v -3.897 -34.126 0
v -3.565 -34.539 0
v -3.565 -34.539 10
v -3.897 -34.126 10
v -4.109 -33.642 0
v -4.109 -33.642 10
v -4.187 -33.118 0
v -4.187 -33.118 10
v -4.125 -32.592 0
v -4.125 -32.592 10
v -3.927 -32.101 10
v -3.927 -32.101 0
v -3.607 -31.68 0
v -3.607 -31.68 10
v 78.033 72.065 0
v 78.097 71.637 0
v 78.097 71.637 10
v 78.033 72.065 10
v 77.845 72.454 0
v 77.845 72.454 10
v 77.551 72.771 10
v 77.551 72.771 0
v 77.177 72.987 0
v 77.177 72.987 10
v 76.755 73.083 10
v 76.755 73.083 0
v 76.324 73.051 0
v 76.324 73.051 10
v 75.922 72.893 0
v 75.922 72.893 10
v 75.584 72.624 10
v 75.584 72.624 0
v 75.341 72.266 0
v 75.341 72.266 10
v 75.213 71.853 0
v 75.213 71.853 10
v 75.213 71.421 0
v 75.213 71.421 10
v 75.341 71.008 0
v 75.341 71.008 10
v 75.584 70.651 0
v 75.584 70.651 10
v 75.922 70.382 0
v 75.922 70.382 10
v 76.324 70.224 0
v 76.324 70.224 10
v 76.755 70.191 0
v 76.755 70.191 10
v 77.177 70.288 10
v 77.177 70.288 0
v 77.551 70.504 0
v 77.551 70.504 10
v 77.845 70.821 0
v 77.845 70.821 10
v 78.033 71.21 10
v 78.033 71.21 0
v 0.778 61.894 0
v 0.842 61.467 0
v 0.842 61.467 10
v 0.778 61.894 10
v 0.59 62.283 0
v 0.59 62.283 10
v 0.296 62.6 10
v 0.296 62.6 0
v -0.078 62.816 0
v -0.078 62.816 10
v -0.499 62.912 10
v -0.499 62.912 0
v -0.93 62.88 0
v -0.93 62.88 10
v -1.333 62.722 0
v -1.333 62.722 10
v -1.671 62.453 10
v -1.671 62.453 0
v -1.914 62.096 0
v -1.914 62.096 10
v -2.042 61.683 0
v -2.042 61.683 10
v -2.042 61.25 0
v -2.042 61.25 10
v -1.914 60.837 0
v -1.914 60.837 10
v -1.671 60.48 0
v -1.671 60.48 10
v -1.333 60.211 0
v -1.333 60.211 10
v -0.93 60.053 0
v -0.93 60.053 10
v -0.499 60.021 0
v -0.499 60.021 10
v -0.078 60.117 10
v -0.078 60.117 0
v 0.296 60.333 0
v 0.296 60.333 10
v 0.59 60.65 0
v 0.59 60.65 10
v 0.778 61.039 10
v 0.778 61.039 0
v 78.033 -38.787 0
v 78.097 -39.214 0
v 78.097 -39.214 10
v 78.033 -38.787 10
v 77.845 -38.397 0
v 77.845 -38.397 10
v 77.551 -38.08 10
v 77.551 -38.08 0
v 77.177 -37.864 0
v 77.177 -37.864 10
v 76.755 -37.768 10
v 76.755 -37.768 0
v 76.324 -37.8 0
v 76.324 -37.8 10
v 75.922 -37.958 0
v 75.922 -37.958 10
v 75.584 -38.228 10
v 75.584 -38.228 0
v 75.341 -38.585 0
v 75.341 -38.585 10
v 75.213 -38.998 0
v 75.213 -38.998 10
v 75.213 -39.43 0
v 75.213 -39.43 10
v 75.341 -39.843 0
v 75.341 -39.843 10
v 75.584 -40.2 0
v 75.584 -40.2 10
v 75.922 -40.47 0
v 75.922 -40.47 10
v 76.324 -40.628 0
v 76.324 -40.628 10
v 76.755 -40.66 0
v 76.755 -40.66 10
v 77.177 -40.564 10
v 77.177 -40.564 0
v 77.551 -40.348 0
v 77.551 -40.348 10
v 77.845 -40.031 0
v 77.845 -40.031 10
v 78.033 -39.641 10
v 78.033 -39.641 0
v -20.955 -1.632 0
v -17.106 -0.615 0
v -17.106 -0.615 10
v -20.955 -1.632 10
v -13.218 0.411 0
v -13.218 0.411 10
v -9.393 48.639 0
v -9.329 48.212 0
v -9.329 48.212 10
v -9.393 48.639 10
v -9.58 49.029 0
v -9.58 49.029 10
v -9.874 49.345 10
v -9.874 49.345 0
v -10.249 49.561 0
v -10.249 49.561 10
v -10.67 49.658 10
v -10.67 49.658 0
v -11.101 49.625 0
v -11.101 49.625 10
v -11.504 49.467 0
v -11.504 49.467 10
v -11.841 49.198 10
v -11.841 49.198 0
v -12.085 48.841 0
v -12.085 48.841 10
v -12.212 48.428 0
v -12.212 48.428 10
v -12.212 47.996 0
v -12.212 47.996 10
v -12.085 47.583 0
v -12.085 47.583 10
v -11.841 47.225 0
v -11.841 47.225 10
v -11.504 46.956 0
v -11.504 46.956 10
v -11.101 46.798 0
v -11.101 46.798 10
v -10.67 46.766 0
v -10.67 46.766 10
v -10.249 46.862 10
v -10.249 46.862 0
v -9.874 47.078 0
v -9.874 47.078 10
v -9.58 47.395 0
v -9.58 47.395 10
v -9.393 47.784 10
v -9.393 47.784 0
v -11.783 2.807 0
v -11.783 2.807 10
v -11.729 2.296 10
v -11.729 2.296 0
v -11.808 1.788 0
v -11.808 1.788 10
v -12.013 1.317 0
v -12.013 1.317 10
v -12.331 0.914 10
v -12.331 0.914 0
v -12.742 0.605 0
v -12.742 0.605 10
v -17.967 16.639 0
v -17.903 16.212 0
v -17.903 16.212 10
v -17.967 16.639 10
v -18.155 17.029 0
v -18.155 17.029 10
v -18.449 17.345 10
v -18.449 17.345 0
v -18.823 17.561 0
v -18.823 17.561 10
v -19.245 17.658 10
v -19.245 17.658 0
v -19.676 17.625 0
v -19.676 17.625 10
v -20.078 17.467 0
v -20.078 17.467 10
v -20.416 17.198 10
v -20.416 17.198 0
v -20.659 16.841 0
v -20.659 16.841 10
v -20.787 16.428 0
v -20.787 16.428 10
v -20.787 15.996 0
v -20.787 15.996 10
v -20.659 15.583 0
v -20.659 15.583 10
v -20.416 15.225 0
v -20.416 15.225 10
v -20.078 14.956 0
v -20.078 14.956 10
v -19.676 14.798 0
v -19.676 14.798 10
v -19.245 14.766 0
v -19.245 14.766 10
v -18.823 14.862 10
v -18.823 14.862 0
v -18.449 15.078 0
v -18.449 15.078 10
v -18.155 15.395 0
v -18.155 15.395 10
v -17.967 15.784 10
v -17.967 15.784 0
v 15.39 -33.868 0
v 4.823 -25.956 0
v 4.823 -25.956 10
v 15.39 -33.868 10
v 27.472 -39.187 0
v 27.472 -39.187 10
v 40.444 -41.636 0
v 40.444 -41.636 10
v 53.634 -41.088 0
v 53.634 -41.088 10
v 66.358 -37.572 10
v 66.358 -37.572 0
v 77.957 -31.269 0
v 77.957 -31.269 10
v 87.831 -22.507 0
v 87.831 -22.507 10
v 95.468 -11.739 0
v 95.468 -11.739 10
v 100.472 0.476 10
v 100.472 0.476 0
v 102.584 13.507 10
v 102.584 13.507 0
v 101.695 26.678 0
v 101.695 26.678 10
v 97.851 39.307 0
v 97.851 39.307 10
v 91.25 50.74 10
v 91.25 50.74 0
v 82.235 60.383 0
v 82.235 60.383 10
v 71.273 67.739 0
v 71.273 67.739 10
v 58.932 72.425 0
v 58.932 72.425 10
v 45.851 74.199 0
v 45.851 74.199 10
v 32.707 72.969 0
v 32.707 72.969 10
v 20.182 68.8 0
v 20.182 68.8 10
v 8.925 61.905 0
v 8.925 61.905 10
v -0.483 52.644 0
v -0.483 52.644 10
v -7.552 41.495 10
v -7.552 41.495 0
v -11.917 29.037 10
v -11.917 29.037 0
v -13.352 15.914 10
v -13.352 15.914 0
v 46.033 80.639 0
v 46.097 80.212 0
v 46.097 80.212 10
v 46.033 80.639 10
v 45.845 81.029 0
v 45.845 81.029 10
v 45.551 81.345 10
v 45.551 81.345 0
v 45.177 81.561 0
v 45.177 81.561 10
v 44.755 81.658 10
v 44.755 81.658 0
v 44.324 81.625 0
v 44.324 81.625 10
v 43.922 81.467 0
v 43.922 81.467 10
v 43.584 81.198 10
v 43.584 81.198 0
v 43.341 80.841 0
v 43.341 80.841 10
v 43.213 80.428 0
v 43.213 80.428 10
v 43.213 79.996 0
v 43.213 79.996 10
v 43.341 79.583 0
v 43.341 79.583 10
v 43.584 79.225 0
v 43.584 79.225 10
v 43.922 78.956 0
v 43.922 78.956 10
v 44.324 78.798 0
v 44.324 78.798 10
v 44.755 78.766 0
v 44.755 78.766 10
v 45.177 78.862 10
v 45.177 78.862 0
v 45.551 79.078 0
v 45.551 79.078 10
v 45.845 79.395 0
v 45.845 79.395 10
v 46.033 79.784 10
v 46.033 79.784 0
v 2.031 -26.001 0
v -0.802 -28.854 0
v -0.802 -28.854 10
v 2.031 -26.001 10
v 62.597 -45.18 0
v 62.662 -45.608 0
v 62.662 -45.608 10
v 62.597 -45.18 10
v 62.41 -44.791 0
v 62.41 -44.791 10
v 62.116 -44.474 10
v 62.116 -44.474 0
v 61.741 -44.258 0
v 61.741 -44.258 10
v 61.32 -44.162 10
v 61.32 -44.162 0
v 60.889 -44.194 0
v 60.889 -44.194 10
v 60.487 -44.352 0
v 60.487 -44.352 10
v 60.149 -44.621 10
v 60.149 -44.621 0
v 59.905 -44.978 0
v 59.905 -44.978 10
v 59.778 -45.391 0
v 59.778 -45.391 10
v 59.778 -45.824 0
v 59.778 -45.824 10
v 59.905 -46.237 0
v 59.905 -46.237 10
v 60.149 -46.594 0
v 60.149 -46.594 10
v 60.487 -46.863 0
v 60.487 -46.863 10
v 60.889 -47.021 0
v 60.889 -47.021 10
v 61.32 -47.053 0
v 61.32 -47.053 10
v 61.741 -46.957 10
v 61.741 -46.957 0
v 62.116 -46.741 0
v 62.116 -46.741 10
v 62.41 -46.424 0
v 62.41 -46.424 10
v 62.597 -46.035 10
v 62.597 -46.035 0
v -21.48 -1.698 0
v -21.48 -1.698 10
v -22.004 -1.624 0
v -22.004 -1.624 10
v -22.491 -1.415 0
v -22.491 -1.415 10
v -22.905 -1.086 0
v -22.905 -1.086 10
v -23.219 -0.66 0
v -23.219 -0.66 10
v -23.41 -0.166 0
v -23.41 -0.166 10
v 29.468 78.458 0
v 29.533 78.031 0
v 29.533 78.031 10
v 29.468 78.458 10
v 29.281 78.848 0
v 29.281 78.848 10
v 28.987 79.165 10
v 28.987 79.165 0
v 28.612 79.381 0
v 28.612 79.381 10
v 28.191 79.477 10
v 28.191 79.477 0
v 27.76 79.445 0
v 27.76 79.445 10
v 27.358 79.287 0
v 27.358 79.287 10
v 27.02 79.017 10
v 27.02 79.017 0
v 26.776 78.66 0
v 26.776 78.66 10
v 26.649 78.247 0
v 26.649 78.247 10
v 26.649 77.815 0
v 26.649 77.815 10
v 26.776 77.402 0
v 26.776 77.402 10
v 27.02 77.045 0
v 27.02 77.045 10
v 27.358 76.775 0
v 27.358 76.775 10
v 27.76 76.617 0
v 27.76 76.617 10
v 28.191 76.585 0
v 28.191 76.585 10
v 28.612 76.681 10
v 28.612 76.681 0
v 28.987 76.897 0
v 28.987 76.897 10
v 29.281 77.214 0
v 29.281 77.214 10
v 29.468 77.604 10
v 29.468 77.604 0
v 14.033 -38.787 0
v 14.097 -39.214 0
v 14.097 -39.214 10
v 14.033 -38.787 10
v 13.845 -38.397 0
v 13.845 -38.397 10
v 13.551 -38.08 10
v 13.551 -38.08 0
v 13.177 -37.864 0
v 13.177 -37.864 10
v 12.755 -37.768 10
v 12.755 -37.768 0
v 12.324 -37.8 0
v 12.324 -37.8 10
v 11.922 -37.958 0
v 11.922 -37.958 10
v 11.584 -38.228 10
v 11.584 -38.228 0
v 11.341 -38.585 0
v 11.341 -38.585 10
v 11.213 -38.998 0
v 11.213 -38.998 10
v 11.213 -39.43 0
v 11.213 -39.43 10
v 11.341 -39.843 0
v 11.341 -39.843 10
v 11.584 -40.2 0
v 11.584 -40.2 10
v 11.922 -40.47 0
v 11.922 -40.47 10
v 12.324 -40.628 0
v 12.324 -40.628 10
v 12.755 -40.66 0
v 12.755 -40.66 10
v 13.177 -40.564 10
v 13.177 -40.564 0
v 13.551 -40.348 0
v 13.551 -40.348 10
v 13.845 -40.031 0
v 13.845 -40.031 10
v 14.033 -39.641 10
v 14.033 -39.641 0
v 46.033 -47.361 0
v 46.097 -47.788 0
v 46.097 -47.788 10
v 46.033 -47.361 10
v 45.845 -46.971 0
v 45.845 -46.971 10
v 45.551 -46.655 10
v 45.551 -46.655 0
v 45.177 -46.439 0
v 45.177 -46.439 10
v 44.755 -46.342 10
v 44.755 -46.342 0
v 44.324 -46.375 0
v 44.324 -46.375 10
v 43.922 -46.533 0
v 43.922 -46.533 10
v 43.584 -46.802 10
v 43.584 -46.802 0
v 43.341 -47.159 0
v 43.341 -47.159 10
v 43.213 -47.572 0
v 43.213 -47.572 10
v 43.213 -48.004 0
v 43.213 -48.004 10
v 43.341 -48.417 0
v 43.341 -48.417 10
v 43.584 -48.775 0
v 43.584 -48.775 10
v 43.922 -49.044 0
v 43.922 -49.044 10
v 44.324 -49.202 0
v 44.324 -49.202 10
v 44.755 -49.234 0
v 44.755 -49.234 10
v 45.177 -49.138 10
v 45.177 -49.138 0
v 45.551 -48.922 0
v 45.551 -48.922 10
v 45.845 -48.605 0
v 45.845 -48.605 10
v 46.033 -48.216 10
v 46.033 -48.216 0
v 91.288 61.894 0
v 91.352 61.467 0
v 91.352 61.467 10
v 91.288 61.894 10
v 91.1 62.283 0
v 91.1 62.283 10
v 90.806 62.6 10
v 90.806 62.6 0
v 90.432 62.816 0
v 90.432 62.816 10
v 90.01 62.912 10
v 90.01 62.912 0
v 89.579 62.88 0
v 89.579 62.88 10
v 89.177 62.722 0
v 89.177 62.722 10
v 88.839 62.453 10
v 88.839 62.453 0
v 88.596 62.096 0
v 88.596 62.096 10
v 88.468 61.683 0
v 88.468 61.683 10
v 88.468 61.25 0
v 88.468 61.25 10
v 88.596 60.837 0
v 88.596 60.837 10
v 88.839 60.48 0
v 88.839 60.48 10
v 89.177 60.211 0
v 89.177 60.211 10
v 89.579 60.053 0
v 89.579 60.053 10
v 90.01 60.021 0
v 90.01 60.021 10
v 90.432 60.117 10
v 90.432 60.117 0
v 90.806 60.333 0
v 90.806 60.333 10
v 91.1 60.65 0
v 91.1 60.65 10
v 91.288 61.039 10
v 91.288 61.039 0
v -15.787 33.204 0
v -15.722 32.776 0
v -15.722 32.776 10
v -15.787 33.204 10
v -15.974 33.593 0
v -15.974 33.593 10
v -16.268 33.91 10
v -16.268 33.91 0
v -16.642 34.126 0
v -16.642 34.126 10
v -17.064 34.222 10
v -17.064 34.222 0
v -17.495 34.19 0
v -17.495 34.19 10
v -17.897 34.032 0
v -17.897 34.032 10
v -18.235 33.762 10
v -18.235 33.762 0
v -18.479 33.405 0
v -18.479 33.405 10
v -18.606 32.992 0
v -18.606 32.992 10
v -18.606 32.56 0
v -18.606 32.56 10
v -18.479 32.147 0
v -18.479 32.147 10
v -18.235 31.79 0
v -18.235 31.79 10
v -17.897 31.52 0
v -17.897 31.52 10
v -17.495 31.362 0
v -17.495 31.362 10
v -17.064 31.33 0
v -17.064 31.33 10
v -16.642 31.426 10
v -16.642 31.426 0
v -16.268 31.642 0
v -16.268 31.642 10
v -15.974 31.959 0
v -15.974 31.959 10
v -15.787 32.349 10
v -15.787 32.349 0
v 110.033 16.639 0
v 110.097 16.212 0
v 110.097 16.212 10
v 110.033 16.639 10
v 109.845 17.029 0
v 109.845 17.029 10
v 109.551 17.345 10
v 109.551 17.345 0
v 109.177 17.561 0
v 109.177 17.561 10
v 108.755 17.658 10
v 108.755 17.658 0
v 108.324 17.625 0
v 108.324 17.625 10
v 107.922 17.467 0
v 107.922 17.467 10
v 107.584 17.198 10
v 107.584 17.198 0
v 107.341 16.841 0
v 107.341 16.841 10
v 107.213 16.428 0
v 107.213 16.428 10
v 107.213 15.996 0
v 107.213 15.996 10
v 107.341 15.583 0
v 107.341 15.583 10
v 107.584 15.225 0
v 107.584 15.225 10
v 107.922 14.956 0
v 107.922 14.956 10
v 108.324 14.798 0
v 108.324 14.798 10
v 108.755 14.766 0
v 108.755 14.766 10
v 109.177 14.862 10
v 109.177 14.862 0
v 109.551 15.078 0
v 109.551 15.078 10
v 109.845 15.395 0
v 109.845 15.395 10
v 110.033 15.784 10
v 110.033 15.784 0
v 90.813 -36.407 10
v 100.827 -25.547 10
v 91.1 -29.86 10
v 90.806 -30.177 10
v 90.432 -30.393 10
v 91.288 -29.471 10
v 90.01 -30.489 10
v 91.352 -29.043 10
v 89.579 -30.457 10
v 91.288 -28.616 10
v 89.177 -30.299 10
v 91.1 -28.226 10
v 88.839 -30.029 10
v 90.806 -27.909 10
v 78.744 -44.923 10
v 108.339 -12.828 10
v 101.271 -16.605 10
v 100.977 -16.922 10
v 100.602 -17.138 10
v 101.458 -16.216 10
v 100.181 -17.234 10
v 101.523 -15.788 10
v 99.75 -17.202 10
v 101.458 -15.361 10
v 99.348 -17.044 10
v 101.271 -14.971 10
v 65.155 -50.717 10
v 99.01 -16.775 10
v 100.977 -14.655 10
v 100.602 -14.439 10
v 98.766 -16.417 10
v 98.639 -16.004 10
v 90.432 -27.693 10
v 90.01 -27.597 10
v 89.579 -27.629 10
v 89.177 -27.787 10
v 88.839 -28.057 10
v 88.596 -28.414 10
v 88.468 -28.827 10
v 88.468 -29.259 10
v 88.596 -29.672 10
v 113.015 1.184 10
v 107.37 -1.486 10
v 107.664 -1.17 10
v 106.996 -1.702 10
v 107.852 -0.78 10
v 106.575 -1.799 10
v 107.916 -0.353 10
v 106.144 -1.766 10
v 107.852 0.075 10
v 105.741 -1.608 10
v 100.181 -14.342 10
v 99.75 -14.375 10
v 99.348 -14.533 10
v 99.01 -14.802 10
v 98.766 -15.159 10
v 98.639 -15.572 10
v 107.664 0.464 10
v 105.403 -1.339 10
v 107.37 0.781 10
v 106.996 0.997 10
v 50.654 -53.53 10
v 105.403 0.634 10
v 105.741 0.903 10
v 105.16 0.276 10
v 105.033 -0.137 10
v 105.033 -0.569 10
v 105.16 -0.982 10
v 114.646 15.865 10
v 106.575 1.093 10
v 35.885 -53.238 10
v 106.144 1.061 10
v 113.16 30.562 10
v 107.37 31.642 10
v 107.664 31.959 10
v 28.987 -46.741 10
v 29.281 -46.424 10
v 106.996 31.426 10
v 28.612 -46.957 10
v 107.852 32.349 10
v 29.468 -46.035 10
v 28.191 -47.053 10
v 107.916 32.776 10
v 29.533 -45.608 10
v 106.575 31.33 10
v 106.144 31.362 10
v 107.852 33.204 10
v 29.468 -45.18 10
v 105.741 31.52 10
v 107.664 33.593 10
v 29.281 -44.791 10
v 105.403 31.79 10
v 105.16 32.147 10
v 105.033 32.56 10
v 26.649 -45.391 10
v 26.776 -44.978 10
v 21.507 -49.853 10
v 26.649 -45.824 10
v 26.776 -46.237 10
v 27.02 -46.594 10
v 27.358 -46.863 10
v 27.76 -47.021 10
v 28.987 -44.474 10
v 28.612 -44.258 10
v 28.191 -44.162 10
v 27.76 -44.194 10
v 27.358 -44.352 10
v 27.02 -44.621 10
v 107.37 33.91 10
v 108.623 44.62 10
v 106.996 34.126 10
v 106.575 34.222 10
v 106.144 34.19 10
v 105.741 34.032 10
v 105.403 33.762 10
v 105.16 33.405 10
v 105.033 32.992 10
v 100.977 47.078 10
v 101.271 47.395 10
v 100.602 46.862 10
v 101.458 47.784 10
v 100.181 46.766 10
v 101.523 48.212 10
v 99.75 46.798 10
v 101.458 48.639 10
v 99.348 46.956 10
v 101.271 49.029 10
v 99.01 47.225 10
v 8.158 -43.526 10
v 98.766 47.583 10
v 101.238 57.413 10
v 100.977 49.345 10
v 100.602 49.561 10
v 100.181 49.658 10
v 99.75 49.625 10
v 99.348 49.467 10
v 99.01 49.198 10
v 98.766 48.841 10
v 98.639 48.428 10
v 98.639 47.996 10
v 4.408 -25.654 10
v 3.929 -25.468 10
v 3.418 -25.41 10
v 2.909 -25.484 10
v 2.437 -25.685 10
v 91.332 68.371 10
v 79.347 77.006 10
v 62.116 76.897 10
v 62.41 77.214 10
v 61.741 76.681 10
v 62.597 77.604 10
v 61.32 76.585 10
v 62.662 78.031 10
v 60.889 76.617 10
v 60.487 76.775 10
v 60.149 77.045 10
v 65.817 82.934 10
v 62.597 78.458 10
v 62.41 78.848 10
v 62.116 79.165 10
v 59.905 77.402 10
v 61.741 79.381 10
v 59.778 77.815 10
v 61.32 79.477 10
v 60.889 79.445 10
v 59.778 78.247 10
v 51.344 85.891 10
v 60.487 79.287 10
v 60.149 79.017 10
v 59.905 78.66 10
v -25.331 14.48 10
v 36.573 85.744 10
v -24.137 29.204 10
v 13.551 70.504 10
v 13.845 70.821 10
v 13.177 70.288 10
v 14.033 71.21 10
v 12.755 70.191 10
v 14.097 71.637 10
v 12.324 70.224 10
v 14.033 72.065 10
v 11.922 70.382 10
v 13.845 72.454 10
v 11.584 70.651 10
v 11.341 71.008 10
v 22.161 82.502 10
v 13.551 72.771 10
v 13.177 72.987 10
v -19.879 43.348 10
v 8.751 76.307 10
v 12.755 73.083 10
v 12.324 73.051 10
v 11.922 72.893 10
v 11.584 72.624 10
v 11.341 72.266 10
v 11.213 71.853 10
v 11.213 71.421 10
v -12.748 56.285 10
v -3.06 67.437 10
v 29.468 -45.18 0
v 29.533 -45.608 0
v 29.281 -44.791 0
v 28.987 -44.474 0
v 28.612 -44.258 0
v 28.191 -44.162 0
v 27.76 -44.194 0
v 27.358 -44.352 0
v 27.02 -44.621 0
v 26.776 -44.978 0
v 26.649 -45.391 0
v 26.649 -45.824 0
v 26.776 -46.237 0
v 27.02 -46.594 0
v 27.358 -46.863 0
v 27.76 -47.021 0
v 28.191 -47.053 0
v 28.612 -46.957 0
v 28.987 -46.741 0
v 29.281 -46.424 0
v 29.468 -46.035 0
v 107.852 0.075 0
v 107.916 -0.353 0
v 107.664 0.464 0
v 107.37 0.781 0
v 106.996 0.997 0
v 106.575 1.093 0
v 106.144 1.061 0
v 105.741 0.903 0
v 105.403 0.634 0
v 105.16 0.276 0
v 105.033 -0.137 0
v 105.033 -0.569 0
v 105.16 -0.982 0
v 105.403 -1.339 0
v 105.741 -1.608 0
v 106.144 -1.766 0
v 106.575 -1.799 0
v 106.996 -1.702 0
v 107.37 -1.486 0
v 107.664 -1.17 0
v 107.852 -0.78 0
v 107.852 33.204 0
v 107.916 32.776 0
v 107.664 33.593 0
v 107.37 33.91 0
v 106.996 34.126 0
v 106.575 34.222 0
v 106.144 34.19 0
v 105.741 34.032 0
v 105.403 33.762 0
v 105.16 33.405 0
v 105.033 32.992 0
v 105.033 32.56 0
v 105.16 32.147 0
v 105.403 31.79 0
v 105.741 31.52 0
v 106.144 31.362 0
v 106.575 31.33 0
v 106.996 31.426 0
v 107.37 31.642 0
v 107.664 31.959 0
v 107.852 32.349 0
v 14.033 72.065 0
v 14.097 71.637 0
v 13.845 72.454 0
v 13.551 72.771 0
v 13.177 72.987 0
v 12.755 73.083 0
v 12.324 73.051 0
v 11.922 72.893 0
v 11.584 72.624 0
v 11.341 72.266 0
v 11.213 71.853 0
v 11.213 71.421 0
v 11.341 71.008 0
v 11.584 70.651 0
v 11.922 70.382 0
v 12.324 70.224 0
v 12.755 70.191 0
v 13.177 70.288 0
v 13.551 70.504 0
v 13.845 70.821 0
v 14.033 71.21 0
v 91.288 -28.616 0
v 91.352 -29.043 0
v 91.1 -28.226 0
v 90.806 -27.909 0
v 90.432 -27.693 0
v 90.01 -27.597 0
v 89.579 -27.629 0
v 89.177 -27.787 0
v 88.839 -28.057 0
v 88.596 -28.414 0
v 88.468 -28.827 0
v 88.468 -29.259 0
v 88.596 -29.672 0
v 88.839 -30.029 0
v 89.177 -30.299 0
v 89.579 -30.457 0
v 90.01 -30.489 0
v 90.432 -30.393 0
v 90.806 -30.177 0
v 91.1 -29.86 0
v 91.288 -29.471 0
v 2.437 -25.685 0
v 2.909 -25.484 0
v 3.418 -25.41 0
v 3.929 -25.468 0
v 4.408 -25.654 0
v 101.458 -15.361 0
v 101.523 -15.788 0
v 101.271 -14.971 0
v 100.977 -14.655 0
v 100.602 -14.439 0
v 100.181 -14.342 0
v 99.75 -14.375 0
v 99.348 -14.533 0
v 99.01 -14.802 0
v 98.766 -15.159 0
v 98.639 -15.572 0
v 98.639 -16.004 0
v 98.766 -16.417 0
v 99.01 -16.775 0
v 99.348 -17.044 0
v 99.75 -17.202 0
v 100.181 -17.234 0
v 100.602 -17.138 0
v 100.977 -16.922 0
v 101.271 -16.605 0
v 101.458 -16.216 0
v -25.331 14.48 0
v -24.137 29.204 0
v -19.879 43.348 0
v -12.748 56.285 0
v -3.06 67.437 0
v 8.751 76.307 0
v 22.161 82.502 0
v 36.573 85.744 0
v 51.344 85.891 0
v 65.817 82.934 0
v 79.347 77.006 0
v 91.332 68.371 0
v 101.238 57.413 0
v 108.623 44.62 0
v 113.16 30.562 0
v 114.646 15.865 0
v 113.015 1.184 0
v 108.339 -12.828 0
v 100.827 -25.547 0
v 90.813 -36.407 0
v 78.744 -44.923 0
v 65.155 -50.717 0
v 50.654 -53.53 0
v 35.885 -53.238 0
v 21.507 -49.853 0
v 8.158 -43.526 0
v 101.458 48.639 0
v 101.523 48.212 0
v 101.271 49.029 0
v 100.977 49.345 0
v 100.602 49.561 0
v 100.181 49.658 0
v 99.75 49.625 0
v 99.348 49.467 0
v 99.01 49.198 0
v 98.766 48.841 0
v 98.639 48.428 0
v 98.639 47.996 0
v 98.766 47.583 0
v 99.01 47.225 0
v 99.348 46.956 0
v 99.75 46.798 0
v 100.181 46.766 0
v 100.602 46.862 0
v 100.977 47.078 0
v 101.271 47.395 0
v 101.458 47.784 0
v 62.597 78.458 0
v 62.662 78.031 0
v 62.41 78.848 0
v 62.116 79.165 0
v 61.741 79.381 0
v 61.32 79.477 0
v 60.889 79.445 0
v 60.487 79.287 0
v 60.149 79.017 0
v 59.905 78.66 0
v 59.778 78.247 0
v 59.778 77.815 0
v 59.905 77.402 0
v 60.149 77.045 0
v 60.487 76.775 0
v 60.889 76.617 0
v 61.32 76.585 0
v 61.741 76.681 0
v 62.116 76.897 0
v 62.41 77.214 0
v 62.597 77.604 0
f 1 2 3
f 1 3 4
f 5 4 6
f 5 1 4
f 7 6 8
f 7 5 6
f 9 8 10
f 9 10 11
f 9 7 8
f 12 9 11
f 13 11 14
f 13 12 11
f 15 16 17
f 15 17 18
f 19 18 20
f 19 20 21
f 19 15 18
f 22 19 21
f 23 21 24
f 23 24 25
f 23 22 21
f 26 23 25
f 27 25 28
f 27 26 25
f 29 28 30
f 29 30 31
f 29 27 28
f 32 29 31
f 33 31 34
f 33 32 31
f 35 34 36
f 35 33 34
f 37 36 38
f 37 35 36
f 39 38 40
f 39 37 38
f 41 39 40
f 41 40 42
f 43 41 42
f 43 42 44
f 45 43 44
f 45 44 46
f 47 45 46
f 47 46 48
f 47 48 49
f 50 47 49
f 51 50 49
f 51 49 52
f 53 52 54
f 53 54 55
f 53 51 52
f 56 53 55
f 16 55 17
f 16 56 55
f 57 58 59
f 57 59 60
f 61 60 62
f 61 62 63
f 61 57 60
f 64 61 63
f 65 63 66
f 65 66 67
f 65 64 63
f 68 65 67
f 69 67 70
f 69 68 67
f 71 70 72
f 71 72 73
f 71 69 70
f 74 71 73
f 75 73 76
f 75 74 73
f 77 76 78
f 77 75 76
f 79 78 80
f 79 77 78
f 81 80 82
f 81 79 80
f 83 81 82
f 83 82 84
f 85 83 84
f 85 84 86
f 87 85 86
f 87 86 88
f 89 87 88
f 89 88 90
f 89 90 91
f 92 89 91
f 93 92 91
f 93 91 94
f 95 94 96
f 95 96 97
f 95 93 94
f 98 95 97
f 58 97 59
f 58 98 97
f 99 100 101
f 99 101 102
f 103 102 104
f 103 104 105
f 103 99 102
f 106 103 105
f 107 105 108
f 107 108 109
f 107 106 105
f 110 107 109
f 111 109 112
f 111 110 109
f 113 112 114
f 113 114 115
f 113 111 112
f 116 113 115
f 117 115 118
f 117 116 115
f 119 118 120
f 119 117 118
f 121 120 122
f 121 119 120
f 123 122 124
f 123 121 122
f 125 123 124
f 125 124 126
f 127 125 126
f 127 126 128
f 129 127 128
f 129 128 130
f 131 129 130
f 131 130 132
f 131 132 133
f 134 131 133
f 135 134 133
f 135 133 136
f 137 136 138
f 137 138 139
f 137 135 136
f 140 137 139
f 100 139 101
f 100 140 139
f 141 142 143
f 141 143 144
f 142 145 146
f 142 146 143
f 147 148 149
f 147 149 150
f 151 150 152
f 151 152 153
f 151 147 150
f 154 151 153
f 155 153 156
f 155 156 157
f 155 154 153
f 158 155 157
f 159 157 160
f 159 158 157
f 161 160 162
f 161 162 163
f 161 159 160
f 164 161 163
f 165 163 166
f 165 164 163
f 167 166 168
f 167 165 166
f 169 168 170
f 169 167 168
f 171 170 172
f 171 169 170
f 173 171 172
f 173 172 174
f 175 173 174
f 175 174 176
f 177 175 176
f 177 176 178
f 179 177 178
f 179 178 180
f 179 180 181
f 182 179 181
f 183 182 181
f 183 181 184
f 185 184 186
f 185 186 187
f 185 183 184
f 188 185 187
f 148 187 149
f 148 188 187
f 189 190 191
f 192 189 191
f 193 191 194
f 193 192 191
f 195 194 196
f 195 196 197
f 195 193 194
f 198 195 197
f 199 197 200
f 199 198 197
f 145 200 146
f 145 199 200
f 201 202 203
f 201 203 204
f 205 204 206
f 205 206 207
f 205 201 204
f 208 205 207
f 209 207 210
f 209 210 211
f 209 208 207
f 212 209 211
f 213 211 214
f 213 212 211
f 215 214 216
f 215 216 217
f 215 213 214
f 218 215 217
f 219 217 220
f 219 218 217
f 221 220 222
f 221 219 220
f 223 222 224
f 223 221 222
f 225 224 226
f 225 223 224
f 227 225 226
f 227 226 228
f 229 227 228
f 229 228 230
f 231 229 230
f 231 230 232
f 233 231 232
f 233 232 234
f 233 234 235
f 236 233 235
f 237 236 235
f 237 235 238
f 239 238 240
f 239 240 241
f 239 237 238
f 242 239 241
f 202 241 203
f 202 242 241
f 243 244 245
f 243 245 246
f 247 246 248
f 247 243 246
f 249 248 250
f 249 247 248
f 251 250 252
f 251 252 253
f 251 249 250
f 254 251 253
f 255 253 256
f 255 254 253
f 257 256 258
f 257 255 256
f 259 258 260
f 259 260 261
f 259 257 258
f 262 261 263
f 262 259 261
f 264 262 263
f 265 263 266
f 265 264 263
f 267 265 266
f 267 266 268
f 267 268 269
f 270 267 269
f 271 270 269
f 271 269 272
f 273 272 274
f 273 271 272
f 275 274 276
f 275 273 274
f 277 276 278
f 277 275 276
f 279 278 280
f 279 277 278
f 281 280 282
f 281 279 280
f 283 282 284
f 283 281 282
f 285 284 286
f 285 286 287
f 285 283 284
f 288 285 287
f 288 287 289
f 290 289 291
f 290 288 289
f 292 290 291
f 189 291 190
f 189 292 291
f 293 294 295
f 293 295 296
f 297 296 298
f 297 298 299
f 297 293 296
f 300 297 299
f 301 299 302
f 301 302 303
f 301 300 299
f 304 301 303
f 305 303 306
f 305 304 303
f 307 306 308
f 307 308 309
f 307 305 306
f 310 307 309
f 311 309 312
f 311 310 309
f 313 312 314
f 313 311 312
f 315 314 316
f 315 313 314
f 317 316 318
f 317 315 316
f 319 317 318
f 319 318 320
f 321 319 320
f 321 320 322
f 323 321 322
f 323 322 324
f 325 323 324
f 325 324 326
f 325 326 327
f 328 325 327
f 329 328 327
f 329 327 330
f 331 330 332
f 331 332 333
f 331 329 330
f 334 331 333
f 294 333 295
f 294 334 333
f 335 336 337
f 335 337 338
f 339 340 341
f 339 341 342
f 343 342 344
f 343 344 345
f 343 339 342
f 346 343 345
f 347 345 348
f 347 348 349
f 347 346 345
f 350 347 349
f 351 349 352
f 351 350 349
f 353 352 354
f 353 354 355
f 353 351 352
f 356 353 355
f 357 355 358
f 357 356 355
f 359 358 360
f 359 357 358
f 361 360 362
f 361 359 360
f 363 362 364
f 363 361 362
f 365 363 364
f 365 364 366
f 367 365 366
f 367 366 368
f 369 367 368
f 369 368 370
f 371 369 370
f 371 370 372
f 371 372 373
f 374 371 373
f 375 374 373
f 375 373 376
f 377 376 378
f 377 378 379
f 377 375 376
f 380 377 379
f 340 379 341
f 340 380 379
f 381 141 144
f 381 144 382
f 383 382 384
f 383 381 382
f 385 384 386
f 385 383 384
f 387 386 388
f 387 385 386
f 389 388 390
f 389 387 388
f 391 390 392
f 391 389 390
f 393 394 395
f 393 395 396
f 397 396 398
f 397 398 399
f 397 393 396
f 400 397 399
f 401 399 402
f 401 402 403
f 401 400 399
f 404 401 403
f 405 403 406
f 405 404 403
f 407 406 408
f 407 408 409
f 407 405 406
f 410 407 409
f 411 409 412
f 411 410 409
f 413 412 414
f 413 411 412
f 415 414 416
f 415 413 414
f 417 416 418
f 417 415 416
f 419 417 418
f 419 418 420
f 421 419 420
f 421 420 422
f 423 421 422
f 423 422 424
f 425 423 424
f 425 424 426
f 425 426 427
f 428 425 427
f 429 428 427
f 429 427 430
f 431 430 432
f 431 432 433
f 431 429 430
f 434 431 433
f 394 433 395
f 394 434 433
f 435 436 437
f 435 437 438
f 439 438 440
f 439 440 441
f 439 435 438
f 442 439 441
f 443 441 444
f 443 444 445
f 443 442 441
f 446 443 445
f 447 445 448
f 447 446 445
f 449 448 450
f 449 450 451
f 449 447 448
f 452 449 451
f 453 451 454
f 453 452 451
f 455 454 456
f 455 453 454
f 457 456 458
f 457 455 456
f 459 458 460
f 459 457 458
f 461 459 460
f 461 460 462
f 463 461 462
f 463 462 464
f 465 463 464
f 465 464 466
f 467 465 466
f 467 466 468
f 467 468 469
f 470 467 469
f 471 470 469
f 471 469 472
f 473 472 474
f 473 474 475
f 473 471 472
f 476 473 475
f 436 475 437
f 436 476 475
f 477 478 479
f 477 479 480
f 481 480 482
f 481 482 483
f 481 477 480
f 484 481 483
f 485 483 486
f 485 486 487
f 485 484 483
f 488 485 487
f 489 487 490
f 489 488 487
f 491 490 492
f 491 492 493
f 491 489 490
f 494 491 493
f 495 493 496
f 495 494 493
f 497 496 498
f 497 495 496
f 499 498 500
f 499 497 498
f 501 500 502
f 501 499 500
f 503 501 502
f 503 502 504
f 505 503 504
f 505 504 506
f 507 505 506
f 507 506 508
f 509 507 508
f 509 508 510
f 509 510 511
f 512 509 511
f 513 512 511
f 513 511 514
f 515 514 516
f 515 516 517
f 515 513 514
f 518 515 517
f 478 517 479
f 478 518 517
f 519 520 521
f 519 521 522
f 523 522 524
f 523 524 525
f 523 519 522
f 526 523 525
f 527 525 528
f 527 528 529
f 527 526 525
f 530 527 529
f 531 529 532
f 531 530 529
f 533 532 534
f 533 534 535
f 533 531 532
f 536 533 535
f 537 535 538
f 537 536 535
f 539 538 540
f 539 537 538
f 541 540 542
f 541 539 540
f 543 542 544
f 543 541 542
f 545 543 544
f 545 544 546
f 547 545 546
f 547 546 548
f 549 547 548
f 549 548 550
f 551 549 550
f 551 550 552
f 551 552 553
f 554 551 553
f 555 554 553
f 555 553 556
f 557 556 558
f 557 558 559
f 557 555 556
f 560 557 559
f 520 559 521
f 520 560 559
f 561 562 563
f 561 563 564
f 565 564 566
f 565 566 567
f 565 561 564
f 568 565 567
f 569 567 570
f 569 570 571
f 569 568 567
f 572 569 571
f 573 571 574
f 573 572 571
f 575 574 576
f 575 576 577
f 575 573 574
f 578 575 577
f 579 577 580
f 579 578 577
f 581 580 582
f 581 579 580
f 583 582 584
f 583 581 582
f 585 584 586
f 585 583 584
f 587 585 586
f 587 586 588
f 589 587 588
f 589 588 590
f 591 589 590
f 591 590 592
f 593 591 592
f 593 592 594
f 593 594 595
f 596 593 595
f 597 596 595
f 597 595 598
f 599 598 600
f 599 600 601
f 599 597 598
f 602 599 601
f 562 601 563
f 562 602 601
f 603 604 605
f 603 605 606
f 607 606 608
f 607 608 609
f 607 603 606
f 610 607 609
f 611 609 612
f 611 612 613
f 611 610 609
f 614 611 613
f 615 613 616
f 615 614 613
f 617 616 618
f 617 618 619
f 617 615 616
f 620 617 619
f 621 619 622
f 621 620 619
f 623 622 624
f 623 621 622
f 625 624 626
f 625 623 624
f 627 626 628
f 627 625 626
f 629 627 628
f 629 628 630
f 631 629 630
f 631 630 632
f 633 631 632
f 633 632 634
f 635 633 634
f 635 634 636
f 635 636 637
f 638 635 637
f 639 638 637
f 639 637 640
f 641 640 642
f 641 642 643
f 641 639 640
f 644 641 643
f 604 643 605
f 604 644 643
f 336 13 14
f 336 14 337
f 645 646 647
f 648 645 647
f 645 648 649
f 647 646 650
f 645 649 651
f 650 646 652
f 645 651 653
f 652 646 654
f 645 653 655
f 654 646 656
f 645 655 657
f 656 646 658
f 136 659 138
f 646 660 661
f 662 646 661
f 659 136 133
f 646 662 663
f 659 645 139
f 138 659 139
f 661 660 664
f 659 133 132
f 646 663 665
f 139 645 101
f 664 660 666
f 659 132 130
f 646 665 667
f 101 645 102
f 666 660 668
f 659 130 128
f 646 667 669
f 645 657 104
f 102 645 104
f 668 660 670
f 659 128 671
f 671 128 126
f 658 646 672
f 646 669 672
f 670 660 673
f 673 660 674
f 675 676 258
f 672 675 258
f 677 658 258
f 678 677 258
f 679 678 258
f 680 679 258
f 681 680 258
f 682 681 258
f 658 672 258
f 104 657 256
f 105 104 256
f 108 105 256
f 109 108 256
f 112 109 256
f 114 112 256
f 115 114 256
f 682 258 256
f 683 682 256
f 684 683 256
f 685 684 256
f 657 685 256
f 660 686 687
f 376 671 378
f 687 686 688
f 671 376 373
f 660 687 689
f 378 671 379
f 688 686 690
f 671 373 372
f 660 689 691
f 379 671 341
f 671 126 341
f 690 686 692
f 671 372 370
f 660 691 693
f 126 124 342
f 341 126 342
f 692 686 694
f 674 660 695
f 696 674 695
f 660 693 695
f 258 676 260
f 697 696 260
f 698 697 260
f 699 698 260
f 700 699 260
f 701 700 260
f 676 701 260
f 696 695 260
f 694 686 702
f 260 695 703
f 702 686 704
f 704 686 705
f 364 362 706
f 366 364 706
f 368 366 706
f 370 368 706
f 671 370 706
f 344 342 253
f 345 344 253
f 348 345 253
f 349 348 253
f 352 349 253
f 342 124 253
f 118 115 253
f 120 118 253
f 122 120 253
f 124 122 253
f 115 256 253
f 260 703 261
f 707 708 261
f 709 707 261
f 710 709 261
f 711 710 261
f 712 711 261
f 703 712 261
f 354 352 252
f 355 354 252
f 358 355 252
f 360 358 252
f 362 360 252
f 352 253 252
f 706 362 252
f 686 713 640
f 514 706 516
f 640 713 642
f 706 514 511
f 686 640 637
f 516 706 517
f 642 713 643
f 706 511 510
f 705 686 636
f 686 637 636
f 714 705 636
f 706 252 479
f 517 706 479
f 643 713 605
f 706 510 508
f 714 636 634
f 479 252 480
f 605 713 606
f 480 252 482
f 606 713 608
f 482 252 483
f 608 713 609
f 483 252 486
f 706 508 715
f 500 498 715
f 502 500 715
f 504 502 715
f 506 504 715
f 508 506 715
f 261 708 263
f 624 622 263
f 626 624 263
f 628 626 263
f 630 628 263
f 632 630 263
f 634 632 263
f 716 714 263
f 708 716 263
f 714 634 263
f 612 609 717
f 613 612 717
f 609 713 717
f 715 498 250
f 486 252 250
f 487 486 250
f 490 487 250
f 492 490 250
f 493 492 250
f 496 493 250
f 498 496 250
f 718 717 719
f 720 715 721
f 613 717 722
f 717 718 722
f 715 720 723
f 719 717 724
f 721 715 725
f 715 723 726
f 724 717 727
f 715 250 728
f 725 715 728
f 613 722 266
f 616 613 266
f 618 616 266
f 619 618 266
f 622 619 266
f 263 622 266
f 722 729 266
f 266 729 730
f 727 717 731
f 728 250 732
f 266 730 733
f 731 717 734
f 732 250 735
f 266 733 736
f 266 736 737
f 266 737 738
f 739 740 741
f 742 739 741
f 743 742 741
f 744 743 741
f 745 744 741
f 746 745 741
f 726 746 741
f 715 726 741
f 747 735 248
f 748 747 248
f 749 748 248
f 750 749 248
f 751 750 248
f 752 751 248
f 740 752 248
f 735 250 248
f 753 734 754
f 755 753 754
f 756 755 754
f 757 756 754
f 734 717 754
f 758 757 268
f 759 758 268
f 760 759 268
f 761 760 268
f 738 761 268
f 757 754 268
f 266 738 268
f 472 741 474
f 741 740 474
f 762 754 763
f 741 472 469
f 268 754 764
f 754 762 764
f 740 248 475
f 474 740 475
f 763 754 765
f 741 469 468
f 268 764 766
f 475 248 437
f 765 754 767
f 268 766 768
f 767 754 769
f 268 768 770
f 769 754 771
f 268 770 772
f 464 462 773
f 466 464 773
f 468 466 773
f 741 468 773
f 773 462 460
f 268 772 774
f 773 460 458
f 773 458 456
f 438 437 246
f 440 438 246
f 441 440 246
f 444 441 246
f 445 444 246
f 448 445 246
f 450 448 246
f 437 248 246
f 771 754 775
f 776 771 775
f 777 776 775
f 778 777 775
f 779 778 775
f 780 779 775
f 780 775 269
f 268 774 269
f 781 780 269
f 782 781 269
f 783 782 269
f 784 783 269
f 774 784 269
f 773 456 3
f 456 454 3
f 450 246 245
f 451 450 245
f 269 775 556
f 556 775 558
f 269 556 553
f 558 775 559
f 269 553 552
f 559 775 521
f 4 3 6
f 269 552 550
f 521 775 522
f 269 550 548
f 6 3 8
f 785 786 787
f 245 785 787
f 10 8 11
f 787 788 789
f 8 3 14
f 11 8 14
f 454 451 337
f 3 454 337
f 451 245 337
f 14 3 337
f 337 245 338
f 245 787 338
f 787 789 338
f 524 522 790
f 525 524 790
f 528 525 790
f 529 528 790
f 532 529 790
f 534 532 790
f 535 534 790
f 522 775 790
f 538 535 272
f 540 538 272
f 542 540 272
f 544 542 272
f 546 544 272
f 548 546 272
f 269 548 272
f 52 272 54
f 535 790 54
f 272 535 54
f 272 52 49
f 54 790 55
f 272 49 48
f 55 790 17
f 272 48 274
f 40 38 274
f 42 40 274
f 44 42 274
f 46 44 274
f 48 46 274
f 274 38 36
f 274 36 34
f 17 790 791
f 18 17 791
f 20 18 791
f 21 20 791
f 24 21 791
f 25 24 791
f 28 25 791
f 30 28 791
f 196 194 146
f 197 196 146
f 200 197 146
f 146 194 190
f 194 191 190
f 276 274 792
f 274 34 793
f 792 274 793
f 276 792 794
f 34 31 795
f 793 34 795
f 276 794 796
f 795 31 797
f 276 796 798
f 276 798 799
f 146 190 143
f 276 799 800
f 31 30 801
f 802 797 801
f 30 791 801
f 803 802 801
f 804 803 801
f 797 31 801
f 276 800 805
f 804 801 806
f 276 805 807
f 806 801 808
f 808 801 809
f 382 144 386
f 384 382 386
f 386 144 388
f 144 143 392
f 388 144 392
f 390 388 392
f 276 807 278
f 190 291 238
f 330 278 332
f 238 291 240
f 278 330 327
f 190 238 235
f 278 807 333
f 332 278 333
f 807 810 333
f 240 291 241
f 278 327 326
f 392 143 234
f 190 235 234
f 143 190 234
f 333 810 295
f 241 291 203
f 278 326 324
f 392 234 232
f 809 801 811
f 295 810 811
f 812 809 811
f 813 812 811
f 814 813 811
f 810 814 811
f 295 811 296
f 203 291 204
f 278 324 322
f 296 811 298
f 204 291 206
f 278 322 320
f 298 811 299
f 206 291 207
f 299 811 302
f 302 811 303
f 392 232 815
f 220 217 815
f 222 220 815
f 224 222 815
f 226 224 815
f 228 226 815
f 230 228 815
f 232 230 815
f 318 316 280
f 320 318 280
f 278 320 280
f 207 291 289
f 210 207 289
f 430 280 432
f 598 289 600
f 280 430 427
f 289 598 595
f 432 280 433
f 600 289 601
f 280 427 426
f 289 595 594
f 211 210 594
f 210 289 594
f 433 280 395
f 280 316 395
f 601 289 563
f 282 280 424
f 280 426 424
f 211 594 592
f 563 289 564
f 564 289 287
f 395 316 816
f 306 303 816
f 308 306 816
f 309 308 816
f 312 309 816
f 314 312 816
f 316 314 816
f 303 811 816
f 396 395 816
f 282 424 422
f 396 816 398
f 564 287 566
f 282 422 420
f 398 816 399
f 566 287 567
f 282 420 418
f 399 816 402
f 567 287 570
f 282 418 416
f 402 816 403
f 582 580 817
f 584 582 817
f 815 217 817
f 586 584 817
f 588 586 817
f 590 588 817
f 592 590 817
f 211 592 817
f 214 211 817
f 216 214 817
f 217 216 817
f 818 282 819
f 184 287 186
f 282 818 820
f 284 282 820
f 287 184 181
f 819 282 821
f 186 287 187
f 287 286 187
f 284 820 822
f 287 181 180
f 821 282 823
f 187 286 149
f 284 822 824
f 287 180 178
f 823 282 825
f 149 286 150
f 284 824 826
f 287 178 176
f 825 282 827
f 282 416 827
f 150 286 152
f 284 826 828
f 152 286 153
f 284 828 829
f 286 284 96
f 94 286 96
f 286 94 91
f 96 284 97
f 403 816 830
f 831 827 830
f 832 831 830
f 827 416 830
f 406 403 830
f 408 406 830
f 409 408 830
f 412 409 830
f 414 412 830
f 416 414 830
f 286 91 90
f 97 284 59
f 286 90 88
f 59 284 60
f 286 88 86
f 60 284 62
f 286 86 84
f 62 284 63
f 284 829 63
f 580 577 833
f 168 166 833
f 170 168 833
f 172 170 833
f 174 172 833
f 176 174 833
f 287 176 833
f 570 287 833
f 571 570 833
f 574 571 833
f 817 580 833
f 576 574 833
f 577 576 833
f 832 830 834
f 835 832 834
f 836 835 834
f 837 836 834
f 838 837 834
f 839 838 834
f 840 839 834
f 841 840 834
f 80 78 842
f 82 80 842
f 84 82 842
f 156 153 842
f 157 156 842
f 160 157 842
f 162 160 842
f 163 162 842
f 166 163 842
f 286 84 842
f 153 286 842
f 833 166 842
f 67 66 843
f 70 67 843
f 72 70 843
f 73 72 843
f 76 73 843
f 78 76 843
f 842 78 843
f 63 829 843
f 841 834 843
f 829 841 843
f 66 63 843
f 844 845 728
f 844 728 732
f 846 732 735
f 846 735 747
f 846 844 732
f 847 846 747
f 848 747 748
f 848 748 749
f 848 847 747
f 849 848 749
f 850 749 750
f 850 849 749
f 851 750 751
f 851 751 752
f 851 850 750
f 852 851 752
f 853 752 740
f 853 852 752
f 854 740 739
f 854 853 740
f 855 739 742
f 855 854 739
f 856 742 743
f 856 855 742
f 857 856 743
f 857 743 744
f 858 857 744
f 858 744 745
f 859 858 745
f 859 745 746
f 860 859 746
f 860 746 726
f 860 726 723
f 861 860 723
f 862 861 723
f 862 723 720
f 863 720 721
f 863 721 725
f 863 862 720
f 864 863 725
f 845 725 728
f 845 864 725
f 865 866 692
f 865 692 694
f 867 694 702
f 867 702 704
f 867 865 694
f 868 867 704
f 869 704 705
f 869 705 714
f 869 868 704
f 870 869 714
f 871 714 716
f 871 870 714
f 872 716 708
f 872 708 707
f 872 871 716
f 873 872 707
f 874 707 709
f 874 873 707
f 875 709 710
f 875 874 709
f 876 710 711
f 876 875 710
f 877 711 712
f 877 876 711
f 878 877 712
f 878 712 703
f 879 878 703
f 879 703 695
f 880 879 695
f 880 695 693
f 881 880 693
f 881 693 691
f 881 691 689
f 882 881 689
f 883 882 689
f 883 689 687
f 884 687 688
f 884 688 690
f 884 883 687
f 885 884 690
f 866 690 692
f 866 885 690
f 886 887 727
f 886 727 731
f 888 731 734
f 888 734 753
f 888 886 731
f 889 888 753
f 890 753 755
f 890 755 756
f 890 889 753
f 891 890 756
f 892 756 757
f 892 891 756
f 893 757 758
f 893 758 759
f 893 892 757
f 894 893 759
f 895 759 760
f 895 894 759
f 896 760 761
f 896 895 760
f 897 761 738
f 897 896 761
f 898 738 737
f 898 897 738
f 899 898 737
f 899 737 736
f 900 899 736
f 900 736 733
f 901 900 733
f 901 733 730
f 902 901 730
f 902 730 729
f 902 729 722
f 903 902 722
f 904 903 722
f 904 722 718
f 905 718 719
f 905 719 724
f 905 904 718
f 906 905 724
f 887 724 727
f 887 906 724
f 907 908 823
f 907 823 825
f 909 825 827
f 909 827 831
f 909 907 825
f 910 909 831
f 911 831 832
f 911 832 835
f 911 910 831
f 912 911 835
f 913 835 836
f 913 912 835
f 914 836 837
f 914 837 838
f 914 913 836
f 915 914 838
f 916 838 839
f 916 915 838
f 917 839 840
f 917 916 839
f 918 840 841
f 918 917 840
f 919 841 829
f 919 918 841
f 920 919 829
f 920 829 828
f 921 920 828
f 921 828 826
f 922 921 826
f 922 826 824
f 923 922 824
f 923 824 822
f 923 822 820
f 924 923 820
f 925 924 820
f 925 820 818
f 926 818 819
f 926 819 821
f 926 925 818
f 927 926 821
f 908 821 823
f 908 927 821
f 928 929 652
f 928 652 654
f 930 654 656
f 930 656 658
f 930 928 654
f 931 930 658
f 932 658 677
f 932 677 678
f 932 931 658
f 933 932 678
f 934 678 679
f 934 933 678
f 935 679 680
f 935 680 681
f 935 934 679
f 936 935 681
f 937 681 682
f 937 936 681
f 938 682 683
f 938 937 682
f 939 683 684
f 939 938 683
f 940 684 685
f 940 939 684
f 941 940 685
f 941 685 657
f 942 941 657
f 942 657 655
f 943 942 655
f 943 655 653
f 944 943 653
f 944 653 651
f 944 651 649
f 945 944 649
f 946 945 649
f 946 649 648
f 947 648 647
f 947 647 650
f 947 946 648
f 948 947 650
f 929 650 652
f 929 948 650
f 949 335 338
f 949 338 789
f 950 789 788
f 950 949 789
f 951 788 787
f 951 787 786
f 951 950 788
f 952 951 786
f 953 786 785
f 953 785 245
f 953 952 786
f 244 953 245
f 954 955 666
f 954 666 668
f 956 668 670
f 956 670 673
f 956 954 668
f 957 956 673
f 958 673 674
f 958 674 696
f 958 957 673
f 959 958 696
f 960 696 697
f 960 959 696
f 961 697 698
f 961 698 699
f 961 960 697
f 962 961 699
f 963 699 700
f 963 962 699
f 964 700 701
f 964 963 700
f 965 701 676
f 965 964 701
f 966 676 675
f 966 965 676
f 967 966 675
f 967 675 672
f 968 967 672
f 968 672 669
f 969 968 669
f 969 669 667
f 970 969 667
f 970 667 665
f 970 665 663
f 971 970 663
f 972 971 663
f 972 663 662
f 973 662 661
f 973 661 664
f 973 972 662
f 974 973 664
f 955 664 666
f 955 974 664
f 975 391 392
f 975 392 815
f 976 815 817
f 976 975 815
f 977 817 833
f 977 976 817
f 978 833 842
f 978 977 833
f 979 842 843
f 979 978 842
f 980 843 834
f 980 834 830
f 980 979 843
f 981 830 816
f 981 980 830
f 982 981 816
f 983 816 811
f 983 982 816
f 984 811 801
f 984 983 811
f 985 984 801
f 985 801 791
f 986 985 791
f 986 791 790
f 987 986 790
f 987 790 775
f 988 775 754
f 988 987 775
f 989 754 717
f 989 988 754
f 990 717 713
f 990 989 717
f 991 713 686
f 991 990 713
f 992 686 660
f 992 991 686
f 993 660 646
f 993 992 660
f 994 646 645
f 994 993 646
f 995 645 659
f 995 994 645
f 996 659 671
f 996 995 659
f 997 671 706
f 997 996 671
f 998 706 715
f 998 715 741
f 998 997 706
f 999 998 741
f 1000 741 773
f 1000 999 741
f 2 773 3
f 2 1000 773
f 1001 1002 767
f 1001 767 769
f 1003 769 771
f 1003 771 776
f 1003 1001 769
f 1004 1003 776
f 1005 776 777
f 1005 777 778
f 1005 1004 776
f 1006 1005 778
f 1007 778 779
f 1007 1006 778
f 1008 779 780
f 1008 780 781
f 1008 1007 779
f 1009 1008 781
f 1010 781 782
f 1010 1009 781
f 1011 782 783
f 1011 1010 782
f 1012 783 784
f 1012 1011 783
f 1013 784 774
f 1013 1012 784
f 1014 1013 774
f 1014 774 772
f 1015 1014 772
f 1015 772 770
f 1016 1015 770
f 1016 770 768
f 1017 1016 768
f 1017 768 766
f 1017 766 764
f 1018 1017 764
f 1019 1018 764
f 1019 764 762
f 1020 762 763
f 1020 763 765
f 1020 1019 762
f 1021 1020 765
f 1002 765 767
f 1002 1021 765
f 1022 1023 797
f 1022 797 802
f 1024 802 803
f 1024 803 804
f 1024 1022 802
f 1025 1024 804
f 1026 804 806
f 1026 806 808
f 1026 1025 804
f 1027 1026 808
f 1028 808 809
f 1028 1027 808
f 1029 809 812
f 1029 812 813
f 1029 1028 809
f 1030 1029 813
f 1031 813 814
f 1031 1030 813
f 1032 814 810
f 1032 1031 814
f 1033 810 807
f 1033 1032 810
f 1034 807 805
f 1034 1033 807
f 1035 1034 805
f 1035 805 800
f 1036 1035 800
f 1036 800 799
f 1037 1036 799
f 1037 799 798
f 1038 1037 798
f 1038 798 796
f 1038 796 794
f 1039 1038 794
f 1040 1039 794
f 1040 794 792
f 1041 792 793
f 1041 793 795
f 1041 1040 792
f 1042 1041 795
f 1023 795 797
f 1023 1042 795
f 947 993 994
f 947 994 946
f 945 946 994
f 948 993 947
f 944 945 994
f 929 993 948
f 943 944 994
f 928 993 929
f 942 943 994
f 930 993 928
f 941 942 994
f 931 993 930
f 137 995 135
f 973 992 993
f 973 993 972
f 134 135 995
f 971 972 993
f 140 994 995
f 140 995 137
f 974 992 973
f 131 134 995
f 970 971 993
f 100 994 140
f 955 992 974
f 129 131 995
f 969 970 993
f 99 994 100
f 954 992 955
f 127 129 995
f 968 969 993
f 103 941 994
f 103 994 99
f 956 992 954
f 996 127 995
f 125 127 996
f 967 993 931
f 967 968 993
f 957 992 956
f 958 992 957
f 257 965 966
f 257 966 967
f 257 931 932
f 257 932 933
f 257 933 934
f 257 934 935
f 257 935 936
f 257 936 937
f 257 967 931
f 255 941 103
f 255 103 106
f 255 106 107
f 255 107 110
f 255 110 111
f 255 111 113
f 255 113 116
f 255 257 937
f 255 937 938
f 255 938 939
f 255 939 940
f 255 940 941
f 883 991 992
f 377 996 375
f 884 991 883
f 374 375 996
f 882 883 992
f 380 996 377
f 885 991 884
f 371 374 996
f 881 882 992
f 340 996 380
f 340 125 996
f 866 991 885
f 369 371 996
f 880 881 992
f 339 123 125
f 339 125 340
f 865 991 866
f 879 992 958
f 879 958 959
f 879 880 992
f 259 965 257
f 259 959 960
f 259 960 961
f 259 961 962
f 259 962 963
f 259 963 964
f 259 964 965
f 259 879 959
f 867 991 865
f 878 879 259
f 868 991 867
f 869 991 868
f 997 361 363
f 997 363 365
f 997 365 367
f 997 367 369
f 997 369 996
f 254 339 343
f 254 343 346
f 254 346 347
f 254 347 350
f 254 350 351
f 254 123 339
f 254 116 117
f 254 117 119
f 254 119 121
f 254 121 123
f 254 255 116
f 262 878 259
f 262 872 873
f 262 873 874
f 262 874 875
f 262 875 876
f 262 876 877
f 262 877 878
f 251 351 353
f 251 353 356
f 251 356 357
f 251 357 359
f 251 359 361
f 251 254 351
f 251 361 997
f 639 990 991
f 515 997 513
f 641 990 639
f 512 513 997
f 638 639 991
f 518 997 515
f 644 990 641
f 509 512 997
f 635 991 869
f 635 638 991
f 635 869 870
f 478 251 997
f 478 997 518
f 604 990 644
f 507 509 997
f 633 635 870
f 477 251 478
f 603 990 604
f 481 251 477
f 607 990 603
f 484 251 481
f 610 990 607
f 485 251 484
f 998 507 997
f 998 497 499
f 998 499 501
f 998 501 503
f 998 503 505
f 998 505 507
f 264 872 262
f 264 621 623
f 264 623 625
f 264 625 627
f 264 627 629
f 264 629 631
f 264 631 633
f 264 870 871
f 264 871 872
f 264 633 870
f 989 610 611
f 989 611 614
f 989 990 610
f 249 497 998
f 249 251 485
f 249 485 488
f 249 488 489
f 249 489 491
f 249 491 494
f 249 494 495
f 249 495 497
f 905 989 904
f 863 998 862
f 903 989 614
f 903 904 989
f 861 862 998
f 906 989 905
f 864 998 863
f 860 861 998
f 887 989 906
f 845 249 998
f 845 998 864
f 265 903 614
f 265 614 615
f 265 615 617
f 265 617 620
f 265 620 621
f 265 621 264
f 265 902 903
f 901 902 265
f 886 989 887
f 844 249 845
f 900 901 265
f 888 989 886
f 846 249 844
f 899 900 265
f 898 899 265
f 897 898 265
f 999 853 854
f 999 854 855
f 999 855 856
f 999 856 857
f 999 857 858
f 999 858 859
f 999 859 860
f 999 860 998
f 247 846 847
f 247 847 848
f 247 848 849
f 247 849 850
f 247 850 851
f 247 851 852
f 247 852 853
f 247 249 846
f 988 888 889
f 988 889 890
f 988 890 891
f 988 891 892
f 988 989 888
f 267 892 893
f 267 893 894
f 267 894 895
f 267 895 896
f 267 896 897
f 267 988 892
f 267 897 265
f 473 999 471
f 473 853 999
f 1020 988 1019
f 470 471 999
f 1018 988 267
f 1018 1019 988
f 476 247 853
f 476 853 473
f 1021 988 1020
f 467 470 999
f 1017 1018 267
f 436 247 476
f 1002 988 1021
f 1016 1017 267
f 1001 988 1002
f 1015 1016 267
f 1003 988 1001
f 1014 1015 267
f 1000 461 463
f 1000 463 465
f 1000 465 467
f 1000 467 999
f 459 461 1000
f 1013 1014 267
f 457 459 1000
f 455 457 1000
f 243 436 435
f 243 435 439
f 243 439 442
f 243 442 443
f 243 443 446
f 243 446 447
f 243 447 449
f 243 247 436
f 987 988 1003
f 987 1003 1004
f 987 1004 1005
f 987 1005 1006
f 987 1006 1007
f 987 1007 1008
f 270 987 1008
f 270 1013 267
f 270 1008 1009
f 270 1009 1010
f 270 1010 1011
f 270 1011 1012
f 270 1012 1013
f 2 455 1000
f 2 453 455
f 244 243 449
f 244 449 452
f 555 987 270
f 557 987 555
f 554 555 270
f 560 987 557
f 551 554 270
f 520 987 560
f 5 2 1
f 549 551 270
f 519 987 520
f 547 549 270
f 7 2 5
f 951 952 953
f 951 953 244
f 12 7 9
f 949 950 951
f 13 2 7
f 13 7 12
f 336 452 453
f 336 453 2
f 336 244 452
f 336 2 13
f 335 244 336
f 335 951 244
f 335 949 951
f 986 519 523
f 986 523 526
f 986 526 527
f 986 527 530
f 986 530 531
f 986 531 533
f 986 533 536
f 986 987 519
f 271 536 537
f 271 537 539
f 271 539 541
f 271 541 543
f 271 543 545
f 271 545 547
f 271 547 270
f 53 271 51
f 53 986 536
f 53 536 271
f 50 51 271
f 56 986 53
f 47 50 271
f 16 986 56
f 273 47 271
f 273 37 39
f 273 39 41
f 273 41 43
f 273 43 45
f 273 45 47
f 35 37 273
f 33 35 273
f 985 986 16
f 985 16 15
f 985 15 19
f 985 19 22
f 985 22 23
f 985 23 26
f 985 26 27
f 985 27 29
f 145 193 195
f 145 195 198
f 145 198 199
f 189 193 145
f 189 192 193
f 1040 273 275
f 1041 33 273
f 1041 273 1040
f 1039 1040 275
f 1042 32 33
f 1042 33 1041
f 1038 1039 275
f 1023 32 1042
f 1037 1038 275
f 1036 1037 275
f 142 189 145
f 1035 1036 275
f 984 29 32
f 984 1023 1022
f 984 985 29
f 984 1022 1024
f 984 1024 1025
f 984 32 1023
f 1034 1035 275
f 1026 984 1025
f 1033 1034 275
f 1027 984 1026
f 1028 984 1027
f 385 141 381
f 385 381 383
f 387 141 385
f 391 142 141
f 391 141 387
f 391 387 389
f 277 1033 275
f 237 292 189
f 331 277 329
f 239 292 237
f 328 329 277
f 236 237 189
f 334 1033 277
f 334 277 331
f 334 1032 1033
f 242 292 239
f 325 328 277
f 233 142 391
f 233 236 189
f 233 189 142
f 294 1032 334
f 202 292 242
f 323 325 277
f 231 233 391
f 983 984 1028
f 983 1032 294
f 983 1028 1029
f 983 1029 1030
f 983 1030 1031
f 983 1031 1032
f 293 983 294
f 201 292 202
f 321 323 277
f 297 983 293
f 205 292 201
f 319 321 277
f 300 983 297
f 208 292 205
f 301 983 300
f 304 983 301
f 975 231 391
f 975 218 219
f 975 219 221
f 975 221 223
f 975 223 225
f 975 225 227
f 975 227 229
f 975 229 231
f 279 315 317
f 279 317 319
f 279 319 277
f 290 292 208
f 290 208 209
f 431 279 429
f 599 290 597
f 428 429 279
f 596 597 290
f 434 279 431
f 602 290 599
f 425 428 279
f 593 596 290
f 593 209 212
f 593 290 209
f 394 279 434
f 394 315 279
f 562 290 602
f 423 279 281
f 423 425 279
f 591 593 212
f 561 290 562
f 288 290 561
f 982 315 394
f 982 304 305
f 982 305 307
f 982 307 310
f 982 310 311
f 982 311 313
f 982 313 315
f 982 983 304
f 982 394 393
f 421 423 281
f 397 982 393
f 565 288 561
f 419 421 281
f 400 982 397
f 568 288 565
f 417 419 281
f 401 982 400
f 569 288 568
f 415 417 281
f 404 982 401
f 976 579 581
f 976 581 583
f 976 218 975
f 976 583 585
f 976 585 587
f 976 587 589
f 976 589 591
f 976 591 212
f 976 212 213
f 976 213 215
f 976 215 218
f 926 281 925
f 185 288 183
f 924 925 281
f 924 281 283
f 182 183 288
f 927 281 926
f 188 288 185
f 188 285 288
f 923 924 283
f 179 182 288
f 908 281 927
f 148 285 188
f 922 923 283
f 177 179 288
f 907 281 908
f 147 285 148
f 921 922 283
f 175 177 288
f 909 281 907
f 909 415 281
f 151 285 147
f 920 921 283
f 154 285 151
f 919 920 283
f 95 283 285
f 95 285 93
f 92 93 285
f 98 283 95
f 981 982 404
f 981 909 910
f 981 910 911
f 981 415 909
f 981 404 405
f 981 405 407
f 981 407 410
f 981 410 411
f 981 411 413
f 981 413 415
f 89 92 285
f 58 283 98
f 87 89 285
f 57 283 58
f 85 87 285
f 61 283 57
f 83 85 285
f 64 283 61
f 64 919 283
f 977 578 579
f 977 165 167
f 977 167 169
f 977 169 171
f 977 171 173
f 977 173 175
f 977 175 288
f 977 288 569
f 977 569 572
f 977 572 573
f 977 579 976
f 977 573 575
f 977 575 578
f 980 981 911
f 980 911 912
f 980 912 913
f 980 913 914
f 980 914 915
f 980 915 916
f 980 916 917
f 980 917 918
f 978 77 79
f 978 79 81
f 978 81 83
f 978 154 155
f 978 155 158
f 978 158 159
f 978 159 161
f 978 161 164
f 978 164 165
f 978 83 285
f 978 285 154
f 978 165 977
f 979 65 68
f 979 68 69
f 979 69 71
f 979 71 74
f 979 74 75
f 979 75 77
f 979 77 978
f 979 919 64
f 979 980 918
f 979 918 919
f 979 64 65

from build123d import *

# Parameters (mm, degrees)
SKETCH1_R           = 1.450000001
BOSS_EXTRUDE1_DEPTH = 10


with BuildPart() as part:
    # Sketch1 → Boss-Extrude1 (new body)
    with BuildSketch(Plane.XY):
        with BuildLine():
            Line((-13.21790593, 0.411052326), (-17.105565361, -0.61539898))
            Line((-17.105565361, -0.61539898), (-20.954961557, -1.631747717))
            ThreePointArc((-20.954961557, -1.631747717), (-22.49079308, -1.415225897), (-23.410010994, -0.165946667))
            ThreePointArc((-23.410010994, -0.165946667), (105.268891372, 51.211716755), (-3.564921525, -34.53864991))
            ThreePointArc((-3.564921525, -34.53864991), (-4.187220117, -33.11794423), (-3.606817752, -31.679614205))
            Line((-3.606817752, -31.679614205), (-0.801935828, -28.854113678))
            Line((-0.801935828, -28.854113678), (2.030826794, -26.000527503))
            ThreePointArc((2.030826794, -26.000527503), (3.417973795, -25.409812538), (4.823439838, -25.955510416))
            ThreePointArc((4.823439838, -25.955510416), (94.876586526, 45.211716755), (-11.782613467, 2.807017621))
            ThreePointArc((-11.782613467, 2.807017621), (-12.012758263, 1.316999385), (-13.21790593, 0.411052326))
        make_face()
        with Locations((-17.172139776, 32.776135645)):
            Circle(SKETCH1_R, mode=Mode.SUBTRACT)
        with Locations((-10.778512735, 48.211716758)):
            Circle(SKETCH1_R, mode=Mode.SUBTRACT)
        with Locations((-19.352886894, 16.211716758)):
            Circle(SKETCH1_R, mode=Mode.SUBTRACT)
        with Locations((106.466365989, -0.352702128)):
            Circle(SKETCH1_R, mode=Mode.SUBTRACT)
        with Locations((100.07273895, -15.788283242)):
            Circle(SKETCH1_R, mode=Mode.SUBTRACT)
        with Locations((89.901947104, -29.043117238)):
            Circle(SKETCH1_R, mode=Mode.SUBTRACT)
        with Locations((76.647113107, -39.213909086)):
            Circle(SKETCH1_R, mode=Mode.SUBTRACT)
        with Locations((61.211531993, -45.607536126)):
            Circle(SKETCH1_R, mode=Mode.SUBTRACT)
        with Locations((44.647113106, -47.788283244)):
            Circle(SKETCH1_R, mode=Mode.SUBTRACT)
        with Locations((28.082694219, -45.607536126)):
            Circle(SKETCH1_R, mode=Mode.SUBTRACT)
        with Locations((12.647113106, -39.213909086)):
            Circle(SKETCH1_R, mode=Mode.SUBTRACT)
        with Locations((-0.607720889, 61.466550753)):
            Circle(SKETCH1_R, mode=Mode.SUBTRACT)
        with Locations((12.647113108, 71.637342599)):
            Circle(SKETCH1_R, mode=Mode.SUBTRACT)
        with Locations((28.08269422, 78.030969639)):
            Circle(SKETCH1_R, mode=Mode.SUBTRACT)
        with Locations((44.647113106, 80.211716756)):
            Circle(SKETCH1_R, mode=Mode.SUBTRACT)
        with Locations((61.211531992, 78.030969639)):
            Circle(SKETCH1_R, mode=Mode.SUBTRACT)
        with Locations((76.647113105, 71.637342599)):
            Circle(SKETCH1_R, mode=Mode.SUBTRACT)
        with Locations((89.901947102, 61.466550752)):
            Circle(SKETCH1_R, mode=Mode.SUBTRACT)
        with Locations((100.072738948, 48.211716757)):
            Circle(SKETCH1_R, mode=Mode.SUBTRACT)
        with Locations((106.466365989, 32.776135644)):
            Circle(SKETCH1_R, mode=Mode.SUBTRACT)
        with Locations((108.647113106, 16.211716758)):
            Circle(SKETCH1_R, mode=Mode.SUBTRACT)
    extrude(amount=BOSS_EXTRUDE1_DEPTH)


solid = part.part
